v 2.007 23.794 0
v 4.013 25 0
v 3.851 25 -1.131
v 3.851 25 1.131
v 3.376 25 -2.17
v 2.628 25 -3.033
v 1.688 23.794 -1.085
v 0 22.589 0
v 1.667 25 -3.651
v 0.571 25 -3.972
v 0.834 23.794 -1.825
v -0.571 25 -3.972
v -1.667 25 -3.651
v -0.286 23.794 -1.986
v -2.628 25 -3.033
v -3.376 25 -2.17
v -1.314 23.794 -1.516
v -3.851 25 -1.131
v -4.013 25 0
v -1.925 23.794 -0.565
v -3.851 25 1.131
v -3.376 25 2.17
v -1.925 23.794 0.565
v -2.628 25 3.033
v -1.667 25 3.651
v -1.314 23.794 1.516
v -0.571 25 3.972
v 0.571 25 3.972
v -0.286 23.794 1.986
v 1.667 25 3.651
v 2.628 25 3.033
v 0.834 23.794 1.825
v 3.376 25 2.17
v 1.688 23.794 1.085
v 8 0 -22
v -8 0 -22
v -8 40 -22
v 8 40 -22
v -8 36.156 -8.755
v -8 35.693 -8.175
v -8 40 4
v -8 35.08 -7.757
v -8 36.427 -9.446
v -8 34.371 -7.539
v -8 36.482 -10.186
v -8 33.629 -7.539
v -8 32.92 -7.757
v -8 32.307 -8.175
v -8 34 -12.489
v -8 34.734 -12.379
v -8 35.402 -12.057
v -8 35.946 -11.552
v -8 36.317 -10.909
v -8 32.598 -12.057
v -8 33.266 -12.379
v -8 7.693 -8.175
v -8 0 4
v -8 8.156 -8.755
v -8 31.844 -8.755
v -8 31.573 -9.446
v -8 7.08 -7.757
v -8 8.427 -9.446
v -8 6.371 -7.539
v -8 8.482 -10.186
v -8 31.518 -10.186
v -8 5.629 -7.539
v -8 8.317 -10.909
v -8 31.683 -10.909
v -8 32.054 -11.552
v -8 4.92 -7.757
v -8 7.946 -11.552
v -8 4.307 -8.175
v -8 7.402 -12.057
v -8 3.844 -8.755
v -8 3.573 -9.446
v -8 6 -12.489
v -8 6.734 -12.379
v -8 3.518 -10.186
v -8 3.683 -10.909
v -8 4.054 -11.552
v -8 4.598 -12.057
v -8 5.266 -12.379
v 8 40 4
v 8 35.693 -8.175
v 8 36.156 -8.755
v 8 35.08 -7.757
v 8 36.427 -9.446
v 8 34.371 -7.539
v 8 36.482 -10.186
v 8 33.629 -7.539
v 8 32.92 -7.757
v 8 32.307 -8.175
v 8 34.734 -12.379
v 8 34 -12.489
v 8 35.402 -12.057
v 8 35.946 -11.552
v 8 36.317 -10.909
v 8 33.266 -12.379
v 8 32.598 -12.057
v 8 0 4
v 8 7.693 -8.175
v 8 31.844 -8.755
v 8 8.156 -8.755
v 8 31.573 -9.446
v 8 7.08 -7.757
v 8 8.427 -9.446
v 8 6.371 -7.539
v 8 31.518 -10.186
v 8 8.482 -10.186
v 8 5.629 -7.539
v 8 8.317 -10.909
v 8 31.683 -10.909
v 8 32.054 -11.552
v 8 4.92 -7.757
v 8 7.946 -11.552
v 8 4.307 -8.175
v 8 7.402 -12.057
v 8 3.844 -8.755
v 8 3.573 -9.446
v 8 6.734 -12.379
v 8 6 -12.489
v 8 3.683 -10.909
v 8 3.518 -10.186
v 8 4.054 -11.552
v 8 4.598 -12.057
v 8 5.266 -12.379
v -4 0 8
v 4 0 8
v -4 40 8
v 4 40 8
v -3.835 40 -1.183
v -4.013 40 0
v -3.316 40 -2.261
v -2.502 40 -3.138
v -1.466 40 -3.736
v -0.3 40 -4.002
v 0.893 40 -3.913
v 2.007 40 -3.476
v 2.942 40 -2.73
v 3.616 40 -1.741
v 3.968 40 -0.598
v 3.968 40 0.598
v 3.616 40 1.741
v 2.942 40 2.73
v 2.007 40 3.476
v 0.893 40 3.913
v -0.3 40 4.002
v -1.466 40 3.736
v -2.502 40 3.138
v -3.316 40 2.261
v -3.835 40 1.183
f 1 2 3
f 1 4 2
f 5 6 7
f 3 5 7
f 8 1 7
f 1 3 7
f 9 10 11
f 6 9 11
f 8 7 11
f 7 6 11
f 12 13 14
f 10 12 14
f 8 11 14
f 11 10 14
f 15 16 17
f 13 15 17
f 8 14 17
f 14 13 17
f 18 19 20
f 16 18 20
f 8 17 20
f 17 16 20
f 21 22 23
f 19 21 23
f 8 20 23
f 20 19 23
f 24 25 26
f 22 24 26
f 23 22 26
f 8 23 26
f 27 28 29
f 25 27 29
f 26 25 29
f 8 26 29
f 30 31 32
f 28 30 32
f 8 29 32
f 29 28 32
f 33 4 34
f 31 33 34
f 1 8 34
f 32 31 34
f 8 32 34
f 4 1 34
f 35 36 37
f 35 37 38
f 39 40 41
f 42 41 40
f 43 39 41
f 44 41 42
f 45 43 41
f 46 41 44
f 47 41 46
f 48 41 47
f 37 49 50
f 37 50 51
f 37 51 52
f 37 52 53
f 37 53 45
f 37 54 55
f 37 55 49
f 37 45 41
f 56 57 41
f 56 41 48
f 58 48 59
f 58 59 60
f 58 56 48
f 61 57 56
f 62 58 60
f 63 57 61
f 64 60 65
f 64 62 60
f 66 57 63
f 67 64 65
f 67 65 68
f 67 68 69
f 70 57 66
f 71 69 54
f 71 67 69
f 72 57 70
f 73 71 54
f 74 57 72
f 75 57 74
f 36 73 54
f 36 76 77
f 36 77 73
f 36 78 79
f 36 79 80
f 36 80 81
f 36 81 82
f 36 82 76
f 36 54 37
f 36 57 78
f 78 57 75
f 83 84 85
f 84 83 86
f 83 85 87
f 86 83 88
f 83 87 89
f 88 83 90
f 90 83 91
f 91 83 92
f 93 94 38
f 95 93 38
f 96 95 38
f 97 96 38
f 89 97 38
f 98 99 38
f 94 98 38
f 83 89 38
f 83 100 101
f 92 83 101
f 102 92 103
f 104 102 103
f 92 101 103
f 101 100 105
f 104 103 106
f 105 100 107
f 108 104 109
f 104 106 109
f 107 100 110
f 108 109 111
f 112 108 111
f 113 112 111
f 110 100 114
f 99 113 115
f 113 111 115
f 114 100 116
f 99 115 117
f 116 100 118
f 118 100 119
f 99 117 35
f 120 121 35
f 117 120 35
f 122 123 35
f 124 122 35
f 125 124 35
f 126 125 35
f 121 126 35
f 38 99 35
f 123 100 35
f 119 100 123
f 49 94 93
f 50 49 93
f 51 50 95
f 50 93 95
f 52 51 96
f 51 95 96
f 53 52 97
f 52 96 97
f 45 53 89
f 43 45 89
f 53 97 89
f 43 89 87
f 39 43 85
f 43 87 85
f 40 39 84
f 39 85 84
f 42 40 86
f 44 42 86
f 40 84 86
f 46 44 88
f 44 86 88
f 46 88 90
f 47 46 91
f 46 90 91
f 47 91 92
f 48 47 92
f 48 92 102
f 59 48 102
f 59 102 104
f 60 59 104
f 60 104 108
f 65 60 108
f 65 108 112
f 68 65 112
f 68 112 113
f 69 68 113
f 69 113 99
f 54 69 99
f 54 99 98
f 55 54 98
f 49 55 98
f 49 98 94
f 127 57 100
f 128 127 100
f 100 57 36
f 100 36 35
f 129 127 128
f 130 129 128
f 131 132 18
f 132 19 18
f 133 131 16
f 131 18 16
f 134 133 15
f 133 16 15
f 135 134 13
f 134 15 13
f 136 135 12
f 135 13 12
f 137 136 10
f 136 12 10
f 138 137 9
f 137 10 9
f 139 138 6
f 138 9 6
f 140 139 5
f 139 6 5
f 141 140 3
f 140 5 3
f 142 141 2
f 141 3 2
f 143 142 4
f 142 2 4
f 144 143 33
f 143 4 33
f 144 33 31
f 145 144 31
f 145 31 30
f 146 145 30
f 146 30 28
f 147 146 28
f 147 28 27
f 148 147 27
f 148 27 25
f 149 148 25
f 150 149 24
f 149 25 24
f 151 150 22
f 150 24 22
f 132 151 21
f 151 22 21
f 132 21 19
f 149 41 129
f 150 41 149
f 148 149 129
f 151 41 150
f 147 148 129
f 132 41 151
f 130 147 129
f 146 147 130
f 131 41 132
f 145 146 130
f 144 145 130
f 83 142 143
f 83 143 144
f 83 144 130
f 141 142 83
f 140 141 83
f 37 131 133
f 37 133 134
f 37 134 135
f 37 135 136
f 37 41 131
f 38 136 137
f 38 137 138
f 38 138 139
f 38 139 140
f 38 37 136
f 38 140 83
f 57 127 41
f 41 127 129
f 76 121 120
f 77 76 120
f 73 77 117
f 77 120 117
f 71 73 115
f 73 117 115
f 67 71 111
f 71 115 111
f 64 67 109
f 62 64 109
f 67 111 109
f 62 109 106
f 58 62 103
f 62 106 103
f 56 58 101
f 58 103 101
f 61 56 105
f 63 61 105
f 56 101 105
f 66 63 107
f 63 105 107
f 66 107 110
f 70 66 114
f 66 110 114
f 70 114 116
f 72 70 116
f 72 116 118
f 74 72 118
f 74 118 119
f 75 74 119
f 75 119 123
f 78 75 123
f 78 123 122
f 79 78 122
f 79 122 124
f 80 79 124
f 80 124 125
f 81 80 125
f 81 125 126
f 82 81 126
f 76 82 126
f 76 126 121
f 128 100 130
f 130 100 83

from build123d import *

# Parameters (mm, degrees)
SKETCH1_W                    = 16
SKETCH1_H                    = 30
BOSS_EXTRUDE1_DEPTH          = 40
O_0_316_DIAMETER_HOLE1_D     = 8.0264
O_0_316_DIAMETER_HOLE1_DEPTH = 15
O_0_316_DIAMETER_HOLE1_TIP   = 2.411373836
F_10_CLEARANCE_HOLE1_D       = 4.9784
CHAMFER1_SIZE                = 4


with BuildPart() as part:
    # Sketch1 → Boss-Extrude1 (new body)
    with BuildSketch(Plane(origin=(0, 0, 0), x_dir=(1, 0, 0), z_dir=(0, 1, 0))):
        with Locations((0, 7)):
            Rectangle(SKETCH1_W, SKETCH1_H)
    extrude(amount=BOSS_EXTRUDE1_DEPTH)

    # O (0.316) Diameter Hole1
    with Locations(Plane(origin=(0, 40, 0), x_dir=(1, 0, 0), z_dir=(0, 1, 0))):
        with Locations((0, 0)):
            Hole(O_0_316_DIAMETER_HOLE1_D / 2, depth=O_0_316_DIAMETER_HOLE1_DEPTH)
            with Locations((0, 0, -(O_0_316_DIAMETER_HOLE1_DEPTH + O_0_316_DIAMETER_HOLE1_TIP / 2))):  # 118° drill point
                Cone(0, O_0_316_DIAMETER_HOLE1_D / 2, O_0_316_DIAMETER_HOLE1_TIP, mode=Mode.SUBTRACT)

    # #10 Clearance Hole1 (through all)
    with Locations(Plane.ZY.offset(8)):
        with Locations((-10, 34), (-10, 6)):
            Hole(F_10_CLEARANCE_HOLE1_D / 2)

    # Chamfer1
    chamfer1_edges = [part.edges().sort_by_distance(p)[0] for p in [
        (8, 20, 8),
        (-8, 20, 8),
    ]]
    chamfer(chamfer1_edges, length=CHAMFER1_SIZE)


solid = part.part
